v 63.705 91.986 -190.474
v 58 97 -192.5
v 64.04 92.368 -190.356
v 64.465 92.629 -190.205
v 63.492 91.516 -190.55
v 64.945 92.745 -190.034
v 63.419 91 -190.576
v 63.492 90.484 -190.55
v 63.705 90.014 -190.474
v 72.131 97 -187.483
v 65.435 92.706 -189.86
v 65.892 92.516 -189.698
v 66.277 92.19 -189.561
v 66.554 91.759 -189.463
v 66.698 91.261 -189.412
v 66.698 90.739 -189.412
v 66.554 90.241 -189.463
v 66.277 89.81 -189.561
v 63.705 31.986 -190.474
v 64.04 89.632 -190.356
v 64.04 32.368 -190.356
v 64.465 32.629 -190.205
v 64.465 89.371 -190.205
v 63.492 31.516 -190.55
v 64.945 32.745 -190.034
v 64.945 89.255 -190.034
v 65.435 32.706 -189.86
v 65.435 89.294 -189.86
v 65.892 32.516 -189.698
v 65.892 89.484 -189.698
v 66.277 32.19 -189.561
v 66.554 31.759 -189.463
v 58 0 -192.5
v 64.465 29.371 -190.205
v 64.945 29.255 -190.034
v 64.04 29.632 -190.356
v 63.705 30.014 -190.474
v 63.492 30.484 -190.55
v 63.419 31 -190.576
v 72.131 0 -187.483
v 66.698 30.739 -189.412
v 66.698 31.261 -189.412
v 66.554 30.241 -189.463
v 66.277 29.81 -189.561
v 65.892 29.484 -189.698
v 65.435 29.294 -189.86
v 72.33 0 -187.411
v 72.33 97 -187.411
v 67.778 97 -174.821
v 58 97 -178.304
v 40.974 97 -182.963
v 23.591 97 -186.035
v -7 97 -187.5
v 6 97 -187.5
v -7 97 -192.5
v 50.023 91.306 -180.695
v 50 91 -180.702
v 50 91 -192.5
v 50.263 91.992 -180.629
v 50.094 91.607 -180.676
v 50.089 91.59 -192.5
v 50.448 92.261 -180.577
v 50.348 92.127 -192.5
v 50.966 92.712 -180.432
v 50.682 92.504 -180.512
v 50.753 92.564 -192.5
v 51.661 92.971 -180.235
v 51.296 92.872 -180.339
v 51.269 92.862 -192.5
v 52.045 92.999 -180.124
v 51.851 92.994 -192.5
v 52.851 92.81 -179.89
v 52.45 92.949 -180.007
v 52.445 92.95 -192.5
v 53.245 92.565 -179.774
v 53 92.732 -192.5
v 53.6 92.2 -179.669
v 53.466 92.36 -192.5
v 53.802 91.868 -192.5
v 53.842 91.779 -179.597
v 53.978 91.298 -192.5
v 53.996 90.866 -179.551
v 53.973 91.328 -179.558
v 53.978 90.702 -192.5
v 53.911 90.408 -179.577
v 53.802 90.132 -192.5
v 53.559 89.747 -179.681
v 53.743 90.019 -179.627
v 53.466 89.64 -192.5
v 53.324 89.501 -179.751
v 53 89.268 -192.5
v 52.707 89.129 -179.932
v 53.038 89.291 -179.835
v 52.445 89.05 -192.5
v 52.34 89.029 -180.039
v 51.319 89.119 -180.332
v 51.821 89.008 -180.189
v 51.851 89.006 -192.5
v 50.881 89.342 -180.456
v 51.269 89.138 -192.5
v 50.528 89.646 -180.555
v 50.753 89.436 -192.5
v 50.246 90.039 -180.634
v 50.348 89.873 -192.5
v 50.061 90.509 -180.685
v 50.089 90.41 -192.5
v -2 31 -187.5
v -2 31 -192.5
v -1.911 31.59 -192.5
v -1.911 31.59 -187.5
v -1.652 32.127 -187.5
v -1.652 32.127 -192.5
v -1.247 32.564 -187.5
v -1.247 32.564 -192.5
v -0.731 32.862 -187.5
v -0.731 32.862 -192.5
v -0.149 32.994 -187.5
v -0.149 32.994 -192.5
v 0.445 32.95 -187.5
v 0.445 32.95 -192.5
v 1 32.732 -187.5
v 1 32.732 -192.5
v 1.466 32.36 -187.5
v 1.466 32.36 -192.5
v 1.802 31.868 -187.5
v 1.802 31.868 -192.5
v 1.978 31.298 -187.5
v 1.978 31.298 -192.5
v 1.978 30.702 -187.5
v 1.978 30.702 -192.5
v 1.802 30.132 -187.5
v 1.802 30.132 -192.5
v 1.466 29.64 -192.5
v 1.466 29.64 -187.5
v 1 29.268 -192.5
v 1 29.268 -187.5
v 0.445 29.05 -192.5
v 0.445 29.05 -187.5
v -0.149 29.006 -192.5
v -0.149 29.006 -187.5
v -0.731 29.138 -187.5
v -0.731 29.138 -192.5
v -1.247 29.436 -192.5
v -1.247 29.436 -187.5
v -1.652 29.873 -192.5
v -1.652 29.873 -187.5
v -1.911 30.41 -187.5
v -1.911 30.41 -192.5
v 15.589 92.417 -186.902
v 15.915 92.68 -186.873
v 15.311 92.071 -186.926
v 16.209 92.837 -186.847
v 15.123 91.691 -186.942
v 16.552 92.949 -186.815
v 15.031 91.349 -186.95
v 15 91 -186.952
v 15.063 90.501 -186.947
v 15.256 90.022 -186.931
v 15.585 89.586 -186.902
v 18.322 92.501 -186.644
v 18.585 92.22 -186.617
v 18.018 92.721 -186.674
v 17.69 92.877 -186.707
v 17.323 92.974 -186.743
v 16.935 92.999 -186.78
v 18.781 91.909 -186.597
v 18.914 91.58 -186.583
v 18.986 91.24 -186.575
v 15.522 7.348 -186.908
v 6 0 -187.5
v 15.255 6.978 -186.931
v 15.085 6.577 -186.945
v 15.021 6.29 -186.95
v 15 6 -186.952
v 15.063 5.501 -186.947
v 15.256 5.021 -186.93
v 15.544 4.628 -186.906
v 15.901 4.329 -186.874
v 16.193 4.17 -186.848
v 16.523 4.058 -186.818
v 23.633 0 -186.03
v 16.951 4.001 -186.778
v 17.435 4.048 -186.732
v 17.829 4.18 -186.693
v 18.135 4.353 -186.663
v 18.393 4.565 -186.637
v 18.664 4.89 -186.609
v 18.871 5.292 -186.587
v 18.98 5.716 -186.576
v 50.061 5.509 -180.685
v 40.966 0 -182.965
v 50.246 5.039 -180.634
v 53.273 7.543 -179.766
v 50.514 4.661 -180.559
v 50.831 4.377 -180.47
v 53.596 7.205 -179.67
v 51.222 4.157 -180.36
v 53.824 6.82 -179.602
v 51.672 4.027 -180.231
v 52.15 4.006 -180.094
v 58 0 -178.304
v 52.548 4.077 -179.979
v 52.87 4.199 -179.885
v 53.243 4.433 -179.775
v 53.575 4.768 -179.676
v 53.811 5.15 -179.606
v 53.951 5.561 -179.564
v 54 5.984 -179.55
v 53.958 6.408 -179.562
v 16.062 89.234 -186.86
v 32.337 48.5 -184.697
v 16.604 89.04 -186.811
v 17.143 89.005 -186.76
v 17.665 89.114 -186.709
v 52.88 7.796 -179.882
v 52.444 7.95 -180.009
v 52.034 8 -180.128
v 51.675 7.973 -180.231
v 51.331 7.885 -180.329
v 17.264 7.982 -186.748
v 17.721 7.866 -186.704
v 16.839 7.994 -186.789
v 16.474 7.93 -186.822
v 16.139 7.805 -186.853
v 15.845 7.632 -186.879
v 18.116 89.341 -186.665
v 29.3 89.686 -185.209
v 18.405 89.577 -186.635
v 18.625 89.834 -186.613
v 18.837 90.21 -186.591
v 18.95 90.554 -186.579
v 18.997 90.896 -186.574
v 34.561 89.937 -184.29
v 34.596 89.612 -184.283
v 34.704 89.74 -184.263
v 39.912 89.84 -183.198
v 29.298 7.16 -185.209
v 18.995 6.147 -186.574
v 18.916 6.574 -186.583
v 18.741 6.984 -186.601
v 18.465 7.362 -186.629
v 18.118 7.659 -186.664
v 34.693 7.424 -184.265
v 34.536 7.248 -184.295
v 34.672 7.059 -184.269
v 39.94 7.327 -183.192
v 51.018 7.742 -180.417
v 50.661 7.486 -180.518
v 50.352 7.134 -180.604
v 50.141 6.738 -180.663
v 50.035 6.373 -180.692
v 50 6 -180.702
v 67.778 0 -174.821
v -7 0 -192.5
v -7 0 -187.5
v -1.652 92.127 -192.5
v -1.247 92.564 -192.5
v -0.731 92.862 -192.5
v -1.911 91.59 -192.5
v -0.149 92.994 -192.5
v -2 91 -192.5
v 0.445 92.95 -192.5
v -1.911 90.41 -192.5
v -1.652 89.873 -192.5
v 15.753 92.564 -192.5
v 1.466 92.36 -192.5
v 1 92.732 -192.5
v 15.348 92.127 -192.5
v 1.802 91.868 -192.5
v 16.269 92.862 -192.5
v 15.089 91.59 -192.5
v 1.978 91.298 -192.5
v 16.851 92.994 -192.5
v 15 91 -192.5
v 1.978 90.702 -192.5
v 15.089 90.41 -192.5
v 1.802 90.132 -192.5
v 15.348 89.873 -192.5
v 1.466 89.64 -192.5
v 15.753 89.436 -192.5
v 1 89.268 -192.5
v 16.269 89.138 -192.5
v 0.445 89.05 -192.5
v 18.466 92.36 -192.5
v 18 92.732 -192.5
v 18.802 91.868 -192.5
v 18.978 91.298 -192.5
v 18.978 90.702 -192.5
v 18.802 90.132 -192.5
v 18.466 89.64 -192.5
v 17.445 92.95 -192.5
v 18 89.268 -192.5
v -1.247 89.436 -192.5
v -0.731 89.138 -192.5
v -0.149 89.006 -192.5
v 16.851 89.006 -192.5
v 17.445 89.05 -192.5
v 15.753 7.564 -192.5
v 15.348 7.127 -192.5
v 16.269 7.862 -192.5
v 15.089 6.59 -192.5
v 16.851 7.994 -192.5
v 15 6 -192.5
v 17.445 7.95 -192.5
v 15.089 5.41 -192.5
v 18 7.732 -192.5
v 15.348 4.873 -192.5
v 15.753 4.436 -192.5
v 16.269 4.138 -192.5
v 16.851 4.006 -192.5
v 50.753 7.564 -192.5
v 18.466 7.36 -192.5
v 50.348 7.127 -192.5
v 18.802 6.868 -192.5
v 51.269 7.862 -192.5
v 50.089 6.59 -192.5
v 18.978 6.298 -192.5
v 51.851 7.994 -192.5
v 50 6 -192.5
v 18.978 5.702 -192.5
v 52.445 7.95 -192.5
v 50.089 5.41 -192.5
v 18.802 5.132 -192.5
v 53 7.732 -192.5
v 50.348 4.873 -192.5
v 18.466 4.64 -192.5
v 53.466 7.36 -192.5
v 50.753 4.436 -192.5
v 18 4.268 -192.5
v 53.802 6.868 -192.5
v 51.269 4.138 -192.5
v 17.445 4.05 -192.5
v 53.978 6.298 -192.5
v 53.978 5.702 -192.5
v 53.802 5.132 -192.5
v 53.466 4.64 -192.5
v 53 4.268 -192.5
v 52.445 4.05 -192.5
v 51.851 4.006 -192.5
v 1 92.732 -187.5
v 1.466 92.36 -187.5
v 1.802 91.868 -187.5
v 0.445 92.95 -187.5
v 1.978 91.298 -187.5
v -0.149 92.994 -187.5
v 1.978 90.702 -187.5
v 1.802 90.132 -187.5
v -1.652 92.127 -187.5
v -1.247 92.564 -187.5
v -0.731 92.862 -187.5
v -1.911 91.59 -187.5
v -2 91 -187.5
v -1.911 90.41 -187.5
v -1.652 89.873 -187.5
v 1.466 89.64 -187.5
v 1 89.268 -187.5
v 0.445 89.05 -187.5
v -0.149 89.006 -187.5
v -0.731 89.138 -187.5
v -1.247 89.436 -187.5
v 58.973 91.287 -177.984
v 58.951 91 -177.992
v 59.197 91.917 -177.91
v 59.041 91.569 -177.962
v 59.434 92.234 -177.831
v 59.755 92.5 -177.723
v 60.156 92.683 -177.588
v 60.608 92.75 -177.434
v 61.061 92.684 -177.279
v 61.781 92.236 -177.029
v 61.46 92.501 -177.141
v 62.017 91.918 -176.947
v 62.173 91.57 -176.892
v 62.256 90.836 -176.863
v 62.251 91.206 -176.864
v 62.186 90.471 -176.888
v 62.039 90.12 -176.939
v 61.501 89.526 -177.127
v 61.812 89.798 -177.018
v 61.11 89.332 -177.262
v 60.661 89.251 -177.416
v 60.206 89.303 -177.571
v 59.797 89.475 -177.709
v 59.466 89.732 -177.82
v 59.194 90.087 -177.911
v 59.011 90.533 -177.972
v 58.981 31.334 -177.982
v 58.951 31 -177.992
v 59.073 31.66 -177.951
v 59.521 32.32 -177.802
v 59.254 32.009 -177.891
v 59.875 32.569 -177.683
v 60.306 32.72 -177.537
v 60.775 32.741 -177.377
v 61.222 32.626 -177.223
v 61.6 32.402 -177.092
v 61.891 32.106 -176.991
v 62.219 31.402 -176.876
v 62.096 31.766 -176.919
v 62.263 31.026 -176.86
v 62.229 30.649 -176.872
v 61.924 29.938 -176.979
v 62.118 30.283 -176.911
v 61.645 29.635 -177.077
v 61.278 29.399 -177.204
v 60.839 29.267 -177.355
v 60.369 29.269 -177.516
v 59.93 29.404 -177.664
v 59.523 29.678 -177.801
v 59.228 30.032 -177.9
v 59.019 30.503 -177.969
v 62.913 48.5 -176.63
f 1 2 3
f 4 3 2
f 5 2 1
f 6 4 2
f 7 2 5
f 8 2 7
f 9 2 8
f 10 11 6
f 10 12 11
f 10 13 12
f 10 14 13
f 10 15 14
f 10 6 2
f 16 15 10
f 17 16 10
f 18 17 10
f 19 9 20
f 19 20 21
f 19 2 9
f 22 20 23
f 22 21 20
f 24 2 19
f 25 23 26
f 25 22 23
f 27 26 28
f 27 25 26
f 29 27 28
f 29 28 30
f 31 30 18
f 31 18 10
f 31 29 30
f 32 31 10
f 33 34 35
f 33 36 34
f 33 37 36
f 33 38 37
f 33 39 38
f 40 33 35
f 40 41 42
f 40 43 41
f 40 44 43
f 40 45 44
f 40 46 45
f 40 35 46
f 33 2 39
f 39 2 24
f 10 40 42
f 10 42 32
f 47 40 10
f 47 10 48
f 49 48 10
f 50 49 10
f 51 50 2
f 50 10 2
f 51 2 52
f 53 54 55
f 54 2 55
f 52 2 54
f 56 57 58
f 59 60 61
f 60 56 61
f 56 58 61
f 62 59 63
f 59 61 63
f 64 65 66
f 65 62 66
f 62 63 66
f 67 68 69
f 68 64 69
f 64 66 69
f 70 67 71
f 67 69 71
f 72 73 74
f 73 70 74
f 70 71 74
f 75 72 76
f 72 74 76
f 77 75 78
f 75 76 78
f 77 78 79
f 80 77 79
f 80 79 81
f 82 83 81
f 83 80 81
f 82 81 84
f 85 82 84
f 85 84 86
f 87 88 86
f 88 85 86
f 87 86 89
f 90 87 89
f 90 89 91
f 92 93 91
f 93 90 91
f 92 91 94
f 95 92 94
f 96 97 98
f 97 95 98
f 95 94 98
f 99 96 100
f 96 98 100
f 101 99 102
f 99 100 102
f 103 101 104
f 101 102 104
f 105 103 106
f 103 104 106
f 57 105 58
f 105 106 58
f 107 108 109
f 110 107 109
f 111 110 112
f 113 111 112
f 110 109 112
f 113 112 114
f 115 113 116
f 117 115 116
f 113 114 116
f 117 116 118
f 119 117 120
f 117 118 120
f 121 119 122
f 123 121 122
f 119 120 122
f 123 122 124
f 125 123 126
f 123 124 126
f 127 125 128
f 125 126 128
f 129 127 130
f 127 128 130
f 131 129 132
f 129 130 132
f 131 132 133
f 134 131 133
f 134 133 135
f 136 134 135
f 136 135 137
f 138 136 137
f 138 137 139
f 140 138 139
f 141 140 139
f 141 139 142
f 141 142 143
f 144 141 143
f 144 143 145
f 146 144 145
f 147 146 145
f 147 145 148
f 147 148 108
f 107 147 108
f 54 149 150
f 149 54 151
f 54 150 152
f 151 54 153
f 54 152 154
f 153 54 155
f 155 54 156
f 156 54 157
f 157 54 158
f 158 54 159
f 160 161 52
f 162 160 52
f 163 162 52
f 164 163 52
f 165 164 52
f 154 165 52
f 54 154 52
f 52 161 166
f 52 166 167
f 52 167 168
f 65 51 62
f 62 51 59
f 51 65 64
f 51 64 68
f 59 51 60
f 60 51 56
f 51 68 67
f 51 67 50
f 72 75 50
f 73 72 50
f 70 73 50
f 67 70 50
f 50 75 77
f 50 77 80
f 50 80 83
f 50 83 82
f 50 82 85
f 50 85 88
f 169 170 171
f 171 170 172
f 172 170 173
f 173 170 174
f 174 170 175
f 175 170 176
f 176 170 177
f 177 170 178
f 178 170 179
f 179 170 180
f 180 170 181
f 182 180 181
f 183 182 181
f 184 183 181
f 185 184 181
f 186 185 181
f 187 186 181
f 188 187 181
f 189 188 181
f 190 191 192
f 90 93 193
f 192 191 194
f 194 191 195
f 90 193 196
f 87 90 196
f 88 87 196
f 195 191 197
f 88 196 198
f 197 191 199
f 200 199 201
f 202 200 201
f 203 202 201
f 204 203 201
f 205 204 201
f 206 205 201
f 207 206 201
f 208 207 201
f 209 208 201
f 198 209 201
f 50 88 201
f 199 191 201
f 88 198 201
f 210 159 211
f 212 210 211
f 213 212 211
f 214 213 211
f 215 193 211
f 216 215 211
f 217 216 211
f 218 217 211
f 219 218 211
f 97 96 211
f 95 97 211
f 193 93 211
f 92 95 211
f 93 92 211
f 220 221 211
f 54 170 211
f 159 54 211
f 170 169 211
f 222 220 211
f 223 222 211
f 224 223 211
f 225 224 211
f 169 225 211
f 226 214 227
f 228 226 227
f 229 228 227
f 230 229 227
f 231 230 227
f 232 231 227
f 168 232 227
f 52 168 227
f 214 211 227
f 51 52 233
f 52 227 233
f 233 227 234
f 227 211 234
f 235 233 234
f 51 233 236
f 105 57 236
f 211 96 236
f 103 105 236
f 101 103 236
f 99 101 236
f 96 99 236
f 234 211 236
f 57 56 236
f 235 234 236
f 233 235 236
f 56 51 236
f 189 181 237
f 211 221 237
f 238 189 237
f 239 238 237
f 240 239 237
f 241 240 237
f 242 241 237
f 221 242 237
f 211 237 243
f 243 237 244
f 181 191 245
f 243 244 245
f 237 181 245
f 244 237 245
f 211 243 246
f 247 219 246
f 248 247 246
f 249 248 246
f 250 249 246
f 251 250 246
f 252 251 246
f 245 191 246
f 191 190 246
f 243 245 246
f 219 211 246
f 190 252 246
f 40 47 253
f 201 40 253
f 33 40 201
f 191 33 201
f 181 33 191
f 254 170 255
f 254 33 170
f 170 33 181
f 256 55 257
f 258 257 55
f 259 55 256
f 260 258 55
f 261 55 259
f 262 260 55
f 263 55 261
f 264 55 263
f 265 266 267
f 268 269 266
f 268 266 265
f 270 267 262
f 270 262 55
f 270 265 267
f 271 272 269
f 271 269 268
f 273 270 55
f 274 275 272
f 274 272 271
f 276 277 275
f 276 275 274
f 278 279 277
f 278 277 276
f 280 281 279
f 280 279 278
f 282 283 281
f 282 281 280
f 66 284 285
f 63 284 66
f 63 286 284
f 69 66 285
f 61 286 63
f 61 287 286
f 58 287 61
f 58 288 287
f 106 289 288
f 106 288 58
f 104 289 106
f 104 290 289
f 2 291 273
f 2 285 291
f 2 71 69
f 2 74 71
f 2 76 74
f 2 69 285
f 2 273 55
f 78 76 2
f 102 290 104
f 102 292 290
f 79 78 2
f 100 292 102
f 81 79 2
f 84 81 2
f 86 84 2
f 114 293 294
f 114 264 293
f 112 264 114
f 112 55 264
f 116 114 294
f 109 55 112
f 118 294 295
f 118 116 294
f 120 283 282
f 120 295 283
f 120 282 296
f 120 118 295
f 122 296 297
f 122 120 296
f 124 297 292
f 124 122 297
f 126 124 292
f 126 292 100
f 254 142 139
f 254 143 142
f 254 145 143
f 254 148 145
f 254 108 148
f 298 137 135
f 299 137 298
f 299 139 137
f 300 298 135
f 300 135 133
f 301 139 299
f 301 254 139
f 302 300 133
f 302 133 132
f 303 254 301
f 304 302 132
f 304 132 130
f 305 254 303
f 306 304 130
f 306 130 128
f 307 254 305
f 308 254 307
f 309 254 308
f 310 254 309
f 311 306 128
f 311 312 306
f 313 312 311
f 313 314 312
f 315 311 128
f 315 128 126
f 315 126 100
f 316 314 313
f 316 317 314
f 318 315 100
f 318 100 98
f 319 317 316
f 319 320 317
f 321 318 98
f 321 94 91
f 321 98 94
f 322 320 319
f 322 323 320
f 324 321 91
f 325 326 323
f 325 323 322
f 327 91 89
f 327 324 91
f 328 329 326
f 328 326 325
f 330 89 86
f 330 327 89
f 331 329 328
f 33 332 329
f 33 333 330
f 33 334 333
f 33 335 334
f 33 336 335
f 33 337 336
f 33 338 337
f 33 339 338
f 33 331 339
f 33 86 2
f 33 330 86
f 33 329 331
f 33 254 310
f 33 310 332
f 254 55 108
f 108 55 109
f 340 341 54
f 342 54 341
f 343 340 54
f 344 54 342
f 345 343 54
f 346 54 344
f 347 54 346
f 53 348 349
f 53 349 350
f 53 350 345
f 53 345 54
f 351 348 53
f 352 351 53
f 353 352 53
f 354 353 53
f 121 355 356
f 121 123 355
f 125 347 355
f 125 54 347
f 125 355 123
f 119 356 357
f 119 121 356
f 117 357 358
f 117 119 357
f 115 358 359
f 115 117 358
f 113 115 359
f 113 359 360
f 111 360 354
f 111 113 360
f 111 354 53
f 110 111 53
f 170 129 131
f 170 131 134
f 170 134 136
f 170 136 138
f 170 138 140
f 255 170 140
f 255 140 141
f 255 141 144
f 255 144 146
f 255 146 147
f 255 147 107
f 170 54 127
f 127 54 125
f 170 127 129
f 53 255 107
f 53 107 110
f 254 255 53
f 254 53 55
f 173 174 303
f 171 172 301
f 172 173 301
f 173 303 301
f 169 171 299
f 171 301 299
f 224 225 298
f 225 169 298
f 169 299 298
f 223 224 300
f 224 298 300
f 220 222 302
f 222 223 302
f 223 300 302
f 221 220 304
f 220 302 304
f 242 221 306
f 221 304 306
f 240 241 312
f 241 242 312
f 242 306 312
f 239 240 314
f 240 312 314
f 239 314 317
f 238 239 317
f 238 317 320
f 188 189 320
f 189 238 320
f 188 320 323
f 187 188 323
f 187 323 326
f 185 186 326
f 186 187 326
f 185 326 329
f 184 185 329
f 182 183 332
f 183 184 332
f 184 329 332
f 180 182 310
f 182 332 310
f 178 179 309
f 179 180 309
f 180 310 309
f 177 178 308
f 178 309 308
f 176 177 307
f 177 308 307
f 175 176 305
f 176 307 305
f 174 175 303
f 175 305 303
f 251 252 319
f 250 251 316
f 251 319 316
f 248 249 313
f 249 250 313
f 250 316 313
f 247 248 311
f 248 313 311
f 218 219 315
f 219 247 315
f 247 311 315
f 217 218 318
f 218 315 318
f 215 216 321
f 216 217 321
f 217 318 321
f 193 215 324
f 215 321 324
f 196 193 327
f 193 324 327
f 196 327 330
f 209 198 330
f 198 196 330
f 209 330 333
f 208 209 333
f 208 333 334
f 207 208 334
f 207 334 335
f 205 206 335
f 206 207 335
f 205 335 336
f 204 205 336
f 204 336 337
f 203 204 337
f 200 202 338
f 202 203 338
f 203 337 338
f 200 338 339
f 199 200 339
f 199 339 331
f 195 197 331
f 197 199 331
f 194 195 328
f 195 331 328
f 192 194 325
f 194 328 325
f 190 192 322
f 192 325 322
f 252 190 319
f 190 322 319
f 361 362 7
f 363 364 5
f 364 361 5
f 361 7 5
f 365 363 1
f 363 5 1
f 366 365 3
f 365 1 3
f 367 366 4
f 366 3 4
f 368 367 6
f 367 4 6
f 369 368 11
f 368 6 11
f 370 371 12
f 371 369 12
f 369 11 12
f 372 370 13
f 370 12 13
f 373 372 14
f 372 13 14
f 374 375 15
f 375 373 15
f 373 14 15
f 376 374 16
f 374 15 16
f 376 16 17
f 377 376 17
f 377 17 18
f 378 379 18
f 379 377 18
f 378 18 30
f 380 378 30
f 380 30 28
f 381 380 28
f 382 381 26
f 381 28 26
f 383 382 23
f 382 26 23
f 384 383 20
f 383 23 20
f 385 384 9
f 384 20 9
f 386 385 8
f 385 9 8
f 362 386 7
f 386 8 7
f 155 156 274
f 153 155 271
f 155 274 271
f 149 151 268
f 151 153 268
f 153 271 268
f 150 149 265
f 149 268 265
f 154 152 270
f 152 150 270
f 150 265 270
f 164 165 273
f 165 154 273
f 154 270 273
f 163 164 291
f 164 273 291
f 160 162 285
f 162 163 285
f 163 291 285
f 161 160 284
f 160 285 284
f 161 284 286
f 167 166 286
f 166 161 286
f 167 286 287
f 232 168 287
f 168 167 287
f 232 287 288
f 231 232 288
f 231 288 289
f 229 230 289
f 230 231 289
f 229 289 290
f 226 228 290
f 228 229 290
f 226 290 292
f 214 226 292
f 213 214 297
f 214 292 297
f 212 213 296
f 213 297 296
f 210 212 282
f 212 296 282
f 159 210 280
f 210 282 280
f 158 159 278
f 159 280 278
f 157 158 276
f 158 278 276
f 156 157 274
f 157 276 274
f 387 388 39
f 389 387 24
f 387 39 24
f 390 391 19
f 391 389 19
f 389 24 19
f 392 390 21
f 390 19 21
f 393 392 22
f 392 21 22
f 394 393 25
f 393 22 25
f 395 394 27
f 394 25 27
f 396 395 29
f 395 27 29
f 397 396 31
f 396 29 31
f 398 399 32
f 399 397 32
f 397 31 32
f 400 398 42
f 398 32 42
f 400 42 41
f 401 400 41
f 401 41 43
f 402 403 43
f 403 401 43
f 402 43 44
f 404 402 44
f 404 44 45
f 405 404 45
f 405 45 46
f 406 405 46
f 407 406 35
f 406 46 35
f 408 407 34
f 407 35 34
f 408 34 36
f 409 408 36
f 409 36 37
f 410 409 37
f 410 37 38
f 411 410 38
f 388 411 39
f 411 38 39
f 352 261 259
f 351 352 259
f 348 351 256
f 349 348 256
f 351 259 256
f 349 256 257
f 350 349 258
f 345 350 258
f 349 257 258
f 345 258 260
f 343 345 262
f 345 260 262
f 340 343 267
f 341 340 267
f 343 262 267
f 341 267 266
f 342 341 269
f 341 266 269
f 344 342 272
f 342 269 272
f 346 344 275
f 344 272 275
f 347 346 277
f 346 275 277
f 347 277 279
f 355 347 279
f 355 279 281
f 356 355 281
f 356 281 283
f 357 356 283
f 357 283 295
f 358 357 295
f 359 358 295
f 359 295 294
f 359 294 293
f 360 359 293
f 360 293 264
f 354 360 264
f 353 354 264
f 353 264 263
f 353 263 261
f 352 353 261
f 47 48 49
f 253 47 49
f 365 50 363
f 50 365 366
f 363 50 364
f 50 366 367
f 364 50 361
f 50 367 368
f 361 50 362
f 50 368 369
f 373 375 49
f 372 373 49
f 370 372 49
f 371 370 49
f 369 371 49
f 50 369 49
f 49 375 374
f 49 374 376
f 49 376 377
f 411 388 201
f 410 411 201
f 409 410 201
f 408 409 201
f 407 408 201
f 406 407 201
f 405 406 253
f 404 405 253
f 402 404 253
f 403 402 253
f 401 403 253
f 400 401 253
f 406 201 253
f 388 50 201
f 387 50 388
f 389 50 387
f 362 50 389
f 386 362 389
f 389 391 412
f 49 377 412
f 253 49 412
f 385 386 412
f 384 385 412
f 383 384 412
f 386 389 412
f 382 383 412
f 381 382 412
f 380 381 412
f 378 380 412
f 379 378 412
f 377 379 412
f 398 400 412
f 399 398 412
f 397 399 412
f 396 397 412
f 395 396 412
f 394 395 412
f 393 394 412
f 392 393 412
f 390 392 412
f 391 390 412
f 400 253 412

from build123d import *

# Parameters (mm, degrees)
BOSS_EXTRUDE1_DEPTH = 120
SKETCH7_R           = 2
SKETCH7_W           = 65
SKETCH7_H           = 23
CUT_EXTRUDE3_DEPTH  = 20
SKETCH8_R           = 1.75
CUT_EXTRUDE4_DEPTH  = 20


with BuildPart() as part:
    # Sketch2 → Boss-Extrude1 (new body)
    with BuildSketch(Plane(origin=(0, 0, 0), x_dir=(1, 0, 0), z_dir=(0, 1, 0))):
        with BuildLine():
            Line((7.497222042, 192.5), (58, 192.5))
            Line((58, 192.5), (72.130758111, 187.482989601))
            Line((72.130758111, 187.482989601), (72.329757157, 187.411039321))
            Line((72.329757157, 187.411039321), (67.777738536, 174.8211319))
            add(Edge.make_bspline(
                [(58, 178.303813756), (62.937238269, 176.697757749), (67.777738536, 174.8211319)],
                knots=[0, 0, 0, 1, 1, 1], degree=2))
            add(Edge.make_bspline(
                [(6, 187.5), (32.674168427, 186.491531402), (58, 178.303813756)],
                knots=[0, 0, 0, 1, 1, 1], degree=2))
            Line((6, 187.5), (-7, 187.5))
            Line((-7, 187.5), (-7, 192.5))
            Line((-7, 192.5), (7.497222042, 192.5))
        make_face()
    extrude(amount=BOSS_EXTRUDE1_DEPTH)

    # Sketch7 → Cut-Extrude3 (cut)
    with BuildSketch(Plane(origin=(0, 0, -192.5), x_dir=(-1, 0, 0), z_dir=(0, 0, -1))):
        with Locations((-17, 6)):
            Circle(SKETCH7_R)
        with Locations((-52, 6)):
            Circle(SKETCH7_R)
        with Locations((-17, 91)):
            Circle(SKETCH7_R)
        with Locations((-52, 91)):
            Circle(SKETCH7_R)
        with Locations((0, 31)):
            Circle(SKETCH7_R)
        with Locations((0, 91)):
            Circle(SKETCH7_R)
        with Locations((-25.5, 108.5)):
            Rectangle(SKETCH7_W, SKETCH7_H)
    extrude(amount=-CUT_EXTRUDE3_DEPTH, mode=Mode.SUBTRACT)

    # Sketch8 → Cut-Extrude4 (cut)
    with BuildSketch(Plane(origin=(67.187435243, 0, -189.238076061), x_dir=(-0.9423674008829427, 0, -0.33457985855865147), z_dir=(0.33457985855865147, 0, -0.9423674008829428))):
        with Locations((2.249313521, 31)):
            Circle(SKETCH8_R)
        with Locations((2.249313521, 91)):
            Circle(SKETCH8_R)
        Polygon((9.749313521, 97), (-5.245642901, 97), (-14.139279105, 97), (-14.139279105, 120), (-5.245642901, 120), (9.749313521, 120), align=None)
    extrude(amount=-CUT_EXTRUDE4_DEPTH, mode=Mode.SUBTRACT)


solid = part.part
